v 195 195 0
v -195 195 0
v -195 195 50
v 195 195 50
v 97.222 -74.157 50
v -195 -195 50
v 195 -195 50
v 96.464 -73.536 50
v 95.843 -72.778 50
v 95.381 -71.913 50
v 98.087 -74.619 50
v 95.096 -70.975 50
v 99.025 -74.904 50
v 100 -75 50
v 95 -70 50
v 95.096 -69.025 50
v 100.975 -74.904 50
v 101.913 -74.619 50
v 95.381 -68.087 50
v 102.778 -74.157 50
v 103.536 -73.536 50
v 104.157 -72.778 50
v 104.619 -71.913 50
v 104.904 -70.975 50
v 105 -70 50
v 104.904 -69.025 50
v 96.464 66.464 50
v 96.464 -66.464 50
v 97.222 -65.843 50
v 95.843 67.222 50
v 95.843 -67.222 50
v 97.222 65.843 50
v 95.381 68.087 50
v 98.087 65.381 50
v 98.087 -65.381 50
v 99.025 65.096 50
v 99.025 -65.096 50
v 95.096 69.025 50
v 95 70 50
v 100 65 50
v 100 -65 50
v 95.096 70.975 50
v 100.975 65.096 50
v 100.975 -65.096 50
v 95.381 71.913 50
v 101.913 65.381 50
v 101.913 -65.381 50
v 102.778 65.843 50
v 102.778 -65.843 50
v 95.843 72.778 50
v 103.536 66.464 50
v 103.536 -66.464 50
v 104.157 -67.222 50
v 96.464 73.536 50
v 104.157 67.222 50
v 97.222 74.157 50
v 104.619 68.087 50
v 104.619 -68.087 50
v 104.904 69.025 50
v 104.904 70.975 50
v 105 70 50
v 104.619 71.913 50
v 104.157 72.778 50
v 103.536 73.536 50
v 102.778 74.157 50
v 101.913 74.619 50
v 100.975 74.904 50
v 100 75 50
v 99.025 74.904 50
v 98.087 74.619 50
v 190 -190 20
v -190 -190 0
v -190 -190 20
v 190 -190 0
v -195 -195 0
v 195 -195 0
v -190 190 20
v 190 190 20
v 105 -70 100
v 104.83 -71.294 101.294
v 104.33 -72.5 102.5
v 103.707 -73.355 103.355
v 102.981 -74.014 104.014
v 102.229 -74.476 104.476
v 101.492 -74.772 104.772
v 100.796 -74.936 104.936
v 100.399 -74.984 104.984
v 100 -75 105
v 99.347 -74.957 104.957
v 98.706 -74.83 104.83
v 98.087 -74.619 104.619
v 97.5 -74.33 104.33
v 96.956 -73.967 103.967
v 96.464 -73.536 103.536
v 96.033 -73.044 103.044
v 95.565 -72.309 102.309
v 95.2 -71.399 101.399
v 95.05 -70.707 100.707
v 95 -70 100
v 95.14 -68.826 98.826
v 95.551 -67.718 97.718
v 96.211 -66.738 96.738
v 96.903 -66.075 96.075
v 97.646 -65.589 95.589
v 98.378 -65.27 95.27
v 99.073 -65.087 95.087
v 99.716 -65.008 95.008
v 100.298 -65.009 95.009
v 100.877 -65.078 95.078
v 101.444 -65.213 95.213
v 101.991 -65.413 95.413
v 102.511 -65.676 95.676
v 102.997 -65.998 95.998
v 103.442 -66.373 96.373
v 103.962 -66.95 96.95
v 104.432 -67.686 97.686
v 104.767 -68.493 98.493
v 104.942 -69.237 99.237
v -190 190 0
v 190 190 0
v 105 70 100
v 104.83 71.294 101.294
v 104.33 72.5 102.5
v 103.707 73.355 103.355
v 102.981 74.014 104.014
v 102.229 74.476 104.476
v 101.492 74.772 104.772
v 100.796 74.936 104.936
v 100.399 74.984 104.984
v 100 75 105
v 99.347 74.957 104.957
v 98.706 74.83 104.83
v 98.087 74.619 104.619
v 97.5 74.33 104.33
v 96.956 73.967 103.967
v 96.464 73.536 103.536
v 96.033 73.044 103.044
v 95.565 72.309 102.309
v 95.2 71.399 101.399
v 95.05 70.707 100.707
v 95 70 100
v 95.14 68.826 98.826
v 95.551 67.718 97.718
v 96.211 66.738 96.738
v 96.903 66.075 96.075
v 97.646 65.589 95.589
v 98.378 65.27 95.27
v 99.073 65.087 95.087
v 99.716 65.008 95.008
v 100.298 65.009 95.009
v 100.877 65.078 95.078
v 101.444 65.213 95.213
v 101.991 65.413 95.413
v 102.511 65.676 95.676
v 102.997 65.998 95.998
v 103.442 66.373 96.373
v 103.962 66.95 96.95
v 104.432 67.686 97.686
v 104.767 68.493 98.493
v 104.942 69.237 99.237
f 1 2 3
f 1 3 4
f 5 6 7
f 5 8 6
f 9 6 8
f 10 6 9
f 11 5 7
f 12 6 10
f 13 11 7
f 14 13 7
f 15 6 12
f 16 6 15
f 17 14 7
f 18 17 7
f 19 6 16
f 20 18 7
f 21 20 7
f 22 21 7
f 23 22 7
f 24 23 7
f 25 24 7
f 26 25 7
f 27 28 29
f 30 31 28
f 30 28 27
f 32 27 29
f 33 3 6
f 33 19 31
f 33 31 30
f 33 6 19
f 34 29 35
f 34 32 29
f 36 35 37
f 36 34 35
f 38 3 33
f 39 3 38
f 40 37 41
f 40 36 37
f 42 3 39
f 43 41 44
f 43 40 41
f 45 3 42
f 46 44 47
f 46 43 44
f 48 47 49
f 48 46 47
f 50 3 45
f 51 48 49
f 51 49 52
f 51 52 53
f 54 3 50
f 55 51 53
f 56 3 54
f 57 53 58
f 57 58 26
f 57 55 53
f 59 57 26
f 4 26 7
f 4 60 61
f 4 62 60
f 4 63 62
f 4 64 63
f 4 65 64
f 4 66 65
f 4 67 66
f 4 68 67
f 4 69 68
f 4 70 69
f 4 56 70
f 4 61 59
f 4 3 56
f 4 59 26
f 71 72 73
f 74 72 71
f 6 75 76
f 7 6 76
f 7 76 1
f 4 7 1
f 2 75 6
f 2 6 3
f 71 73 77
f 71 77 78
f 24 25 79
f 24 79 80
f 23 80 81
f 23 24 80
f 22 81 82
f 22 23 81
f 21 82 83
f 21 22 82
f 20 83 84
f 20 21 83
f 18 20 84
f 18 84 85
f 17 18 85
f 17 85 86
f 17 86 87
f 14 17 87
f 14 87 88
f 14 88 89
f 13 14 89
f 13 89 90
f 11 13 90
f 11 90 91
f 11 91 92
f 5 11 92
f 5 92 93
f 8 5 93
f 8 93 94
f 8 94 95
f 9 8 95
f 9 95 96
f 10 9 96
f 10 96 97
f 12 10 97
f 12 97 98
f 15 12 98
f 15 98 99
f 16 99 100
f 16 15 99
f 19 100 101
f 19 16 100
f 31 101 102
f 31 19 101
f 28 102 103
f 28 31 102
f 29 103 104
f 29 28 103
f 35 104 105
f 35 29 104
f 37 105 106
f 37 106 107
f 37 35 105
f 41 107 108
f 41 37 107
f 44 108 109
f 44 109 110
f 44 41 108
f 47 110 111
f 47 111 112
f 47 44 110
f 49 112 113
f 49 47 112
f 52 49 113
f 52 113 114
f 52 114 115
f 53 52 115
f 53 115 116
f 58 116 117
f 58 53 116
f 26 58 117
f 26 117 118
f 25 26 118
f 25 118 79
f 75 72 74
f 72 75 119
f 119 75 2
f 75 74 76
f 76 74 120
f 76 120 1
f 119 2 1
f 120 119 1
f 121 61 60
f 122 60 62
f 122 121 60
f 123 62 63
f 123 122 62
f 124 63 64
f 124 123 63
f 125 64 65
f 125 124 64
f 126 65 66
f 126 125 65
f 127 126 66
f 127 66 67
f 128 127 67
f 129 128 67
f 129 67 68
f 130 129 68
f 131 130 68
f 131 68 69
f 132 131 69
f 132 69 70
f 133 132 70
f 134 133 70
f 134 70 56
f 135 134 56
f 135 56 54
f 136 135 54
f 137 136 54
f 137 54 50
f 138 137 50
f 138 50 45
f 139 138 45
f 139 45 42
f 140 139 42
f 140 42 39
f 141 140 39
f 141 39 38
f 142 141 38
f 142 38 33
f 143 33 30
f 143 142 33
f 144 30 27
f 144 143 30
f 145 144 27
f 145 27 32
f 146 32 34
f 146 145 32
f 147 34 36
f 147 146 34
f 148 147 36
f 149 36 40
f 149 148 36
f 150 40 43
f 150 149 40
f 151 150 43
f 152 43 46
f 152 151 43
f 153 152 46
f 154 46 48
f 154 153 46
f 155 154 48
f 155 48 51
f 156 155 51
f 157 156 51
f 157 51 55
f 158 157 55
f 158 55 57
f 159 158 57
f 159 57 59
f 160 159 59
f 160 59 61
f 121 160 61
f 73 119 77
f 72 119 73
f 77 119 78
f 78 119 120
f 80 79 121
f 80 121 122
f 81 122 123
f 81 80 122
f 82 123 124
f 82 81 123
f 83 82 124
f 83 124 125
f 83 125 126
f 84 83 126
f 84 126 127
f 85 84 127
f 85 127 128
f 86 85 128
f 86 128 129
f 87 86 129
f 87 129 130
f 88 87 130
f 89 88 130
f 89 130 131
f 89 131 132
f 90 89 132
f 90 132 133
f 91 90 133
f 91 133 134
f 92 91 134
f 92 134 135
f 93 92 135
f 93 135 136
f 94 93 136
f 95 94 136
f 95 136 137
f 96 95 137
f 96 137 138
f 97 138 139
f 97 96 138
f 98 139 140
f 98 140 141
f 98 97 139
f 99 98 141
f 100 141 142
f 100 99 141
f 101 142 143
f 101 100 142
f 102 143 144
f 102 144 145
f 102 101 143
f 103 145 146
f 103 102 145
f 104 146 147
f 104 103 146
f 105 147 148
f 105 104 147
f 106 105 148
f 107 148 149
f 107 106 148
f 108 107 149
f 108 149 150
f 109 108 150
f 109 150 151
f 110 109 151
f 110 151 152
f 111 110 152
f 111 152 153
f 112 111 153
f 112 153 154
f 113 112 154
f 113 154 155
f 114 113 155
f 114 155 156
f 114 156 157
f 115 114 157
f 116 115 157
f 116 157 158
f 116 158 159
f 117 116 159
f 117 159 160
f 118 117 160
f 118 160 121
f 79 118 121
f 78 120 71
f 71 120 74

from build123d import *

# Parameters (mm, degrees)
F0_W     = 390
F0_H     = 390
F1_DEPTH = 50
F2_W     = 380
F2_H     = 380
F3_DEPTH = 20
F6_R     = 5


with BuildPart() as f1:
    # F0 (on Top) → F1 (new body)
    with BuildSketch(Plane.XY):
        Rectangle(F0_W, F0_H)
    extrude(amount=F1_DEPTH)

    # F2 (on face) → F3 (cut)
    with BuildSketch(Plane(origin=(0, 0, 0), x_dir=(1, 0, 0), z_dir=(0, 0, -1))):
        Rectangle(F2_W, F2_H)
    extrude(amount=-F3_DEPTH, mode=Mode.SUBTRACT)

    # F7: sweep along a path in F5
    with BuildLine(Plane.YZ.offset(100)) as f7_path:
        Line((70, 50), (70, 100))
        Line((70, 100), (-70, 100))
        Line((-70, 100), (-70, 50))
    # F6 (on face) → F7 (sweep)
    with BuildSketch(Plane.XY.offset(50)):
        with Locations((100, 70)):
            Circle(F6_R)
    sweep(path=f7_path.line, transition=Transition.RIGHT)


solid = f1.part
